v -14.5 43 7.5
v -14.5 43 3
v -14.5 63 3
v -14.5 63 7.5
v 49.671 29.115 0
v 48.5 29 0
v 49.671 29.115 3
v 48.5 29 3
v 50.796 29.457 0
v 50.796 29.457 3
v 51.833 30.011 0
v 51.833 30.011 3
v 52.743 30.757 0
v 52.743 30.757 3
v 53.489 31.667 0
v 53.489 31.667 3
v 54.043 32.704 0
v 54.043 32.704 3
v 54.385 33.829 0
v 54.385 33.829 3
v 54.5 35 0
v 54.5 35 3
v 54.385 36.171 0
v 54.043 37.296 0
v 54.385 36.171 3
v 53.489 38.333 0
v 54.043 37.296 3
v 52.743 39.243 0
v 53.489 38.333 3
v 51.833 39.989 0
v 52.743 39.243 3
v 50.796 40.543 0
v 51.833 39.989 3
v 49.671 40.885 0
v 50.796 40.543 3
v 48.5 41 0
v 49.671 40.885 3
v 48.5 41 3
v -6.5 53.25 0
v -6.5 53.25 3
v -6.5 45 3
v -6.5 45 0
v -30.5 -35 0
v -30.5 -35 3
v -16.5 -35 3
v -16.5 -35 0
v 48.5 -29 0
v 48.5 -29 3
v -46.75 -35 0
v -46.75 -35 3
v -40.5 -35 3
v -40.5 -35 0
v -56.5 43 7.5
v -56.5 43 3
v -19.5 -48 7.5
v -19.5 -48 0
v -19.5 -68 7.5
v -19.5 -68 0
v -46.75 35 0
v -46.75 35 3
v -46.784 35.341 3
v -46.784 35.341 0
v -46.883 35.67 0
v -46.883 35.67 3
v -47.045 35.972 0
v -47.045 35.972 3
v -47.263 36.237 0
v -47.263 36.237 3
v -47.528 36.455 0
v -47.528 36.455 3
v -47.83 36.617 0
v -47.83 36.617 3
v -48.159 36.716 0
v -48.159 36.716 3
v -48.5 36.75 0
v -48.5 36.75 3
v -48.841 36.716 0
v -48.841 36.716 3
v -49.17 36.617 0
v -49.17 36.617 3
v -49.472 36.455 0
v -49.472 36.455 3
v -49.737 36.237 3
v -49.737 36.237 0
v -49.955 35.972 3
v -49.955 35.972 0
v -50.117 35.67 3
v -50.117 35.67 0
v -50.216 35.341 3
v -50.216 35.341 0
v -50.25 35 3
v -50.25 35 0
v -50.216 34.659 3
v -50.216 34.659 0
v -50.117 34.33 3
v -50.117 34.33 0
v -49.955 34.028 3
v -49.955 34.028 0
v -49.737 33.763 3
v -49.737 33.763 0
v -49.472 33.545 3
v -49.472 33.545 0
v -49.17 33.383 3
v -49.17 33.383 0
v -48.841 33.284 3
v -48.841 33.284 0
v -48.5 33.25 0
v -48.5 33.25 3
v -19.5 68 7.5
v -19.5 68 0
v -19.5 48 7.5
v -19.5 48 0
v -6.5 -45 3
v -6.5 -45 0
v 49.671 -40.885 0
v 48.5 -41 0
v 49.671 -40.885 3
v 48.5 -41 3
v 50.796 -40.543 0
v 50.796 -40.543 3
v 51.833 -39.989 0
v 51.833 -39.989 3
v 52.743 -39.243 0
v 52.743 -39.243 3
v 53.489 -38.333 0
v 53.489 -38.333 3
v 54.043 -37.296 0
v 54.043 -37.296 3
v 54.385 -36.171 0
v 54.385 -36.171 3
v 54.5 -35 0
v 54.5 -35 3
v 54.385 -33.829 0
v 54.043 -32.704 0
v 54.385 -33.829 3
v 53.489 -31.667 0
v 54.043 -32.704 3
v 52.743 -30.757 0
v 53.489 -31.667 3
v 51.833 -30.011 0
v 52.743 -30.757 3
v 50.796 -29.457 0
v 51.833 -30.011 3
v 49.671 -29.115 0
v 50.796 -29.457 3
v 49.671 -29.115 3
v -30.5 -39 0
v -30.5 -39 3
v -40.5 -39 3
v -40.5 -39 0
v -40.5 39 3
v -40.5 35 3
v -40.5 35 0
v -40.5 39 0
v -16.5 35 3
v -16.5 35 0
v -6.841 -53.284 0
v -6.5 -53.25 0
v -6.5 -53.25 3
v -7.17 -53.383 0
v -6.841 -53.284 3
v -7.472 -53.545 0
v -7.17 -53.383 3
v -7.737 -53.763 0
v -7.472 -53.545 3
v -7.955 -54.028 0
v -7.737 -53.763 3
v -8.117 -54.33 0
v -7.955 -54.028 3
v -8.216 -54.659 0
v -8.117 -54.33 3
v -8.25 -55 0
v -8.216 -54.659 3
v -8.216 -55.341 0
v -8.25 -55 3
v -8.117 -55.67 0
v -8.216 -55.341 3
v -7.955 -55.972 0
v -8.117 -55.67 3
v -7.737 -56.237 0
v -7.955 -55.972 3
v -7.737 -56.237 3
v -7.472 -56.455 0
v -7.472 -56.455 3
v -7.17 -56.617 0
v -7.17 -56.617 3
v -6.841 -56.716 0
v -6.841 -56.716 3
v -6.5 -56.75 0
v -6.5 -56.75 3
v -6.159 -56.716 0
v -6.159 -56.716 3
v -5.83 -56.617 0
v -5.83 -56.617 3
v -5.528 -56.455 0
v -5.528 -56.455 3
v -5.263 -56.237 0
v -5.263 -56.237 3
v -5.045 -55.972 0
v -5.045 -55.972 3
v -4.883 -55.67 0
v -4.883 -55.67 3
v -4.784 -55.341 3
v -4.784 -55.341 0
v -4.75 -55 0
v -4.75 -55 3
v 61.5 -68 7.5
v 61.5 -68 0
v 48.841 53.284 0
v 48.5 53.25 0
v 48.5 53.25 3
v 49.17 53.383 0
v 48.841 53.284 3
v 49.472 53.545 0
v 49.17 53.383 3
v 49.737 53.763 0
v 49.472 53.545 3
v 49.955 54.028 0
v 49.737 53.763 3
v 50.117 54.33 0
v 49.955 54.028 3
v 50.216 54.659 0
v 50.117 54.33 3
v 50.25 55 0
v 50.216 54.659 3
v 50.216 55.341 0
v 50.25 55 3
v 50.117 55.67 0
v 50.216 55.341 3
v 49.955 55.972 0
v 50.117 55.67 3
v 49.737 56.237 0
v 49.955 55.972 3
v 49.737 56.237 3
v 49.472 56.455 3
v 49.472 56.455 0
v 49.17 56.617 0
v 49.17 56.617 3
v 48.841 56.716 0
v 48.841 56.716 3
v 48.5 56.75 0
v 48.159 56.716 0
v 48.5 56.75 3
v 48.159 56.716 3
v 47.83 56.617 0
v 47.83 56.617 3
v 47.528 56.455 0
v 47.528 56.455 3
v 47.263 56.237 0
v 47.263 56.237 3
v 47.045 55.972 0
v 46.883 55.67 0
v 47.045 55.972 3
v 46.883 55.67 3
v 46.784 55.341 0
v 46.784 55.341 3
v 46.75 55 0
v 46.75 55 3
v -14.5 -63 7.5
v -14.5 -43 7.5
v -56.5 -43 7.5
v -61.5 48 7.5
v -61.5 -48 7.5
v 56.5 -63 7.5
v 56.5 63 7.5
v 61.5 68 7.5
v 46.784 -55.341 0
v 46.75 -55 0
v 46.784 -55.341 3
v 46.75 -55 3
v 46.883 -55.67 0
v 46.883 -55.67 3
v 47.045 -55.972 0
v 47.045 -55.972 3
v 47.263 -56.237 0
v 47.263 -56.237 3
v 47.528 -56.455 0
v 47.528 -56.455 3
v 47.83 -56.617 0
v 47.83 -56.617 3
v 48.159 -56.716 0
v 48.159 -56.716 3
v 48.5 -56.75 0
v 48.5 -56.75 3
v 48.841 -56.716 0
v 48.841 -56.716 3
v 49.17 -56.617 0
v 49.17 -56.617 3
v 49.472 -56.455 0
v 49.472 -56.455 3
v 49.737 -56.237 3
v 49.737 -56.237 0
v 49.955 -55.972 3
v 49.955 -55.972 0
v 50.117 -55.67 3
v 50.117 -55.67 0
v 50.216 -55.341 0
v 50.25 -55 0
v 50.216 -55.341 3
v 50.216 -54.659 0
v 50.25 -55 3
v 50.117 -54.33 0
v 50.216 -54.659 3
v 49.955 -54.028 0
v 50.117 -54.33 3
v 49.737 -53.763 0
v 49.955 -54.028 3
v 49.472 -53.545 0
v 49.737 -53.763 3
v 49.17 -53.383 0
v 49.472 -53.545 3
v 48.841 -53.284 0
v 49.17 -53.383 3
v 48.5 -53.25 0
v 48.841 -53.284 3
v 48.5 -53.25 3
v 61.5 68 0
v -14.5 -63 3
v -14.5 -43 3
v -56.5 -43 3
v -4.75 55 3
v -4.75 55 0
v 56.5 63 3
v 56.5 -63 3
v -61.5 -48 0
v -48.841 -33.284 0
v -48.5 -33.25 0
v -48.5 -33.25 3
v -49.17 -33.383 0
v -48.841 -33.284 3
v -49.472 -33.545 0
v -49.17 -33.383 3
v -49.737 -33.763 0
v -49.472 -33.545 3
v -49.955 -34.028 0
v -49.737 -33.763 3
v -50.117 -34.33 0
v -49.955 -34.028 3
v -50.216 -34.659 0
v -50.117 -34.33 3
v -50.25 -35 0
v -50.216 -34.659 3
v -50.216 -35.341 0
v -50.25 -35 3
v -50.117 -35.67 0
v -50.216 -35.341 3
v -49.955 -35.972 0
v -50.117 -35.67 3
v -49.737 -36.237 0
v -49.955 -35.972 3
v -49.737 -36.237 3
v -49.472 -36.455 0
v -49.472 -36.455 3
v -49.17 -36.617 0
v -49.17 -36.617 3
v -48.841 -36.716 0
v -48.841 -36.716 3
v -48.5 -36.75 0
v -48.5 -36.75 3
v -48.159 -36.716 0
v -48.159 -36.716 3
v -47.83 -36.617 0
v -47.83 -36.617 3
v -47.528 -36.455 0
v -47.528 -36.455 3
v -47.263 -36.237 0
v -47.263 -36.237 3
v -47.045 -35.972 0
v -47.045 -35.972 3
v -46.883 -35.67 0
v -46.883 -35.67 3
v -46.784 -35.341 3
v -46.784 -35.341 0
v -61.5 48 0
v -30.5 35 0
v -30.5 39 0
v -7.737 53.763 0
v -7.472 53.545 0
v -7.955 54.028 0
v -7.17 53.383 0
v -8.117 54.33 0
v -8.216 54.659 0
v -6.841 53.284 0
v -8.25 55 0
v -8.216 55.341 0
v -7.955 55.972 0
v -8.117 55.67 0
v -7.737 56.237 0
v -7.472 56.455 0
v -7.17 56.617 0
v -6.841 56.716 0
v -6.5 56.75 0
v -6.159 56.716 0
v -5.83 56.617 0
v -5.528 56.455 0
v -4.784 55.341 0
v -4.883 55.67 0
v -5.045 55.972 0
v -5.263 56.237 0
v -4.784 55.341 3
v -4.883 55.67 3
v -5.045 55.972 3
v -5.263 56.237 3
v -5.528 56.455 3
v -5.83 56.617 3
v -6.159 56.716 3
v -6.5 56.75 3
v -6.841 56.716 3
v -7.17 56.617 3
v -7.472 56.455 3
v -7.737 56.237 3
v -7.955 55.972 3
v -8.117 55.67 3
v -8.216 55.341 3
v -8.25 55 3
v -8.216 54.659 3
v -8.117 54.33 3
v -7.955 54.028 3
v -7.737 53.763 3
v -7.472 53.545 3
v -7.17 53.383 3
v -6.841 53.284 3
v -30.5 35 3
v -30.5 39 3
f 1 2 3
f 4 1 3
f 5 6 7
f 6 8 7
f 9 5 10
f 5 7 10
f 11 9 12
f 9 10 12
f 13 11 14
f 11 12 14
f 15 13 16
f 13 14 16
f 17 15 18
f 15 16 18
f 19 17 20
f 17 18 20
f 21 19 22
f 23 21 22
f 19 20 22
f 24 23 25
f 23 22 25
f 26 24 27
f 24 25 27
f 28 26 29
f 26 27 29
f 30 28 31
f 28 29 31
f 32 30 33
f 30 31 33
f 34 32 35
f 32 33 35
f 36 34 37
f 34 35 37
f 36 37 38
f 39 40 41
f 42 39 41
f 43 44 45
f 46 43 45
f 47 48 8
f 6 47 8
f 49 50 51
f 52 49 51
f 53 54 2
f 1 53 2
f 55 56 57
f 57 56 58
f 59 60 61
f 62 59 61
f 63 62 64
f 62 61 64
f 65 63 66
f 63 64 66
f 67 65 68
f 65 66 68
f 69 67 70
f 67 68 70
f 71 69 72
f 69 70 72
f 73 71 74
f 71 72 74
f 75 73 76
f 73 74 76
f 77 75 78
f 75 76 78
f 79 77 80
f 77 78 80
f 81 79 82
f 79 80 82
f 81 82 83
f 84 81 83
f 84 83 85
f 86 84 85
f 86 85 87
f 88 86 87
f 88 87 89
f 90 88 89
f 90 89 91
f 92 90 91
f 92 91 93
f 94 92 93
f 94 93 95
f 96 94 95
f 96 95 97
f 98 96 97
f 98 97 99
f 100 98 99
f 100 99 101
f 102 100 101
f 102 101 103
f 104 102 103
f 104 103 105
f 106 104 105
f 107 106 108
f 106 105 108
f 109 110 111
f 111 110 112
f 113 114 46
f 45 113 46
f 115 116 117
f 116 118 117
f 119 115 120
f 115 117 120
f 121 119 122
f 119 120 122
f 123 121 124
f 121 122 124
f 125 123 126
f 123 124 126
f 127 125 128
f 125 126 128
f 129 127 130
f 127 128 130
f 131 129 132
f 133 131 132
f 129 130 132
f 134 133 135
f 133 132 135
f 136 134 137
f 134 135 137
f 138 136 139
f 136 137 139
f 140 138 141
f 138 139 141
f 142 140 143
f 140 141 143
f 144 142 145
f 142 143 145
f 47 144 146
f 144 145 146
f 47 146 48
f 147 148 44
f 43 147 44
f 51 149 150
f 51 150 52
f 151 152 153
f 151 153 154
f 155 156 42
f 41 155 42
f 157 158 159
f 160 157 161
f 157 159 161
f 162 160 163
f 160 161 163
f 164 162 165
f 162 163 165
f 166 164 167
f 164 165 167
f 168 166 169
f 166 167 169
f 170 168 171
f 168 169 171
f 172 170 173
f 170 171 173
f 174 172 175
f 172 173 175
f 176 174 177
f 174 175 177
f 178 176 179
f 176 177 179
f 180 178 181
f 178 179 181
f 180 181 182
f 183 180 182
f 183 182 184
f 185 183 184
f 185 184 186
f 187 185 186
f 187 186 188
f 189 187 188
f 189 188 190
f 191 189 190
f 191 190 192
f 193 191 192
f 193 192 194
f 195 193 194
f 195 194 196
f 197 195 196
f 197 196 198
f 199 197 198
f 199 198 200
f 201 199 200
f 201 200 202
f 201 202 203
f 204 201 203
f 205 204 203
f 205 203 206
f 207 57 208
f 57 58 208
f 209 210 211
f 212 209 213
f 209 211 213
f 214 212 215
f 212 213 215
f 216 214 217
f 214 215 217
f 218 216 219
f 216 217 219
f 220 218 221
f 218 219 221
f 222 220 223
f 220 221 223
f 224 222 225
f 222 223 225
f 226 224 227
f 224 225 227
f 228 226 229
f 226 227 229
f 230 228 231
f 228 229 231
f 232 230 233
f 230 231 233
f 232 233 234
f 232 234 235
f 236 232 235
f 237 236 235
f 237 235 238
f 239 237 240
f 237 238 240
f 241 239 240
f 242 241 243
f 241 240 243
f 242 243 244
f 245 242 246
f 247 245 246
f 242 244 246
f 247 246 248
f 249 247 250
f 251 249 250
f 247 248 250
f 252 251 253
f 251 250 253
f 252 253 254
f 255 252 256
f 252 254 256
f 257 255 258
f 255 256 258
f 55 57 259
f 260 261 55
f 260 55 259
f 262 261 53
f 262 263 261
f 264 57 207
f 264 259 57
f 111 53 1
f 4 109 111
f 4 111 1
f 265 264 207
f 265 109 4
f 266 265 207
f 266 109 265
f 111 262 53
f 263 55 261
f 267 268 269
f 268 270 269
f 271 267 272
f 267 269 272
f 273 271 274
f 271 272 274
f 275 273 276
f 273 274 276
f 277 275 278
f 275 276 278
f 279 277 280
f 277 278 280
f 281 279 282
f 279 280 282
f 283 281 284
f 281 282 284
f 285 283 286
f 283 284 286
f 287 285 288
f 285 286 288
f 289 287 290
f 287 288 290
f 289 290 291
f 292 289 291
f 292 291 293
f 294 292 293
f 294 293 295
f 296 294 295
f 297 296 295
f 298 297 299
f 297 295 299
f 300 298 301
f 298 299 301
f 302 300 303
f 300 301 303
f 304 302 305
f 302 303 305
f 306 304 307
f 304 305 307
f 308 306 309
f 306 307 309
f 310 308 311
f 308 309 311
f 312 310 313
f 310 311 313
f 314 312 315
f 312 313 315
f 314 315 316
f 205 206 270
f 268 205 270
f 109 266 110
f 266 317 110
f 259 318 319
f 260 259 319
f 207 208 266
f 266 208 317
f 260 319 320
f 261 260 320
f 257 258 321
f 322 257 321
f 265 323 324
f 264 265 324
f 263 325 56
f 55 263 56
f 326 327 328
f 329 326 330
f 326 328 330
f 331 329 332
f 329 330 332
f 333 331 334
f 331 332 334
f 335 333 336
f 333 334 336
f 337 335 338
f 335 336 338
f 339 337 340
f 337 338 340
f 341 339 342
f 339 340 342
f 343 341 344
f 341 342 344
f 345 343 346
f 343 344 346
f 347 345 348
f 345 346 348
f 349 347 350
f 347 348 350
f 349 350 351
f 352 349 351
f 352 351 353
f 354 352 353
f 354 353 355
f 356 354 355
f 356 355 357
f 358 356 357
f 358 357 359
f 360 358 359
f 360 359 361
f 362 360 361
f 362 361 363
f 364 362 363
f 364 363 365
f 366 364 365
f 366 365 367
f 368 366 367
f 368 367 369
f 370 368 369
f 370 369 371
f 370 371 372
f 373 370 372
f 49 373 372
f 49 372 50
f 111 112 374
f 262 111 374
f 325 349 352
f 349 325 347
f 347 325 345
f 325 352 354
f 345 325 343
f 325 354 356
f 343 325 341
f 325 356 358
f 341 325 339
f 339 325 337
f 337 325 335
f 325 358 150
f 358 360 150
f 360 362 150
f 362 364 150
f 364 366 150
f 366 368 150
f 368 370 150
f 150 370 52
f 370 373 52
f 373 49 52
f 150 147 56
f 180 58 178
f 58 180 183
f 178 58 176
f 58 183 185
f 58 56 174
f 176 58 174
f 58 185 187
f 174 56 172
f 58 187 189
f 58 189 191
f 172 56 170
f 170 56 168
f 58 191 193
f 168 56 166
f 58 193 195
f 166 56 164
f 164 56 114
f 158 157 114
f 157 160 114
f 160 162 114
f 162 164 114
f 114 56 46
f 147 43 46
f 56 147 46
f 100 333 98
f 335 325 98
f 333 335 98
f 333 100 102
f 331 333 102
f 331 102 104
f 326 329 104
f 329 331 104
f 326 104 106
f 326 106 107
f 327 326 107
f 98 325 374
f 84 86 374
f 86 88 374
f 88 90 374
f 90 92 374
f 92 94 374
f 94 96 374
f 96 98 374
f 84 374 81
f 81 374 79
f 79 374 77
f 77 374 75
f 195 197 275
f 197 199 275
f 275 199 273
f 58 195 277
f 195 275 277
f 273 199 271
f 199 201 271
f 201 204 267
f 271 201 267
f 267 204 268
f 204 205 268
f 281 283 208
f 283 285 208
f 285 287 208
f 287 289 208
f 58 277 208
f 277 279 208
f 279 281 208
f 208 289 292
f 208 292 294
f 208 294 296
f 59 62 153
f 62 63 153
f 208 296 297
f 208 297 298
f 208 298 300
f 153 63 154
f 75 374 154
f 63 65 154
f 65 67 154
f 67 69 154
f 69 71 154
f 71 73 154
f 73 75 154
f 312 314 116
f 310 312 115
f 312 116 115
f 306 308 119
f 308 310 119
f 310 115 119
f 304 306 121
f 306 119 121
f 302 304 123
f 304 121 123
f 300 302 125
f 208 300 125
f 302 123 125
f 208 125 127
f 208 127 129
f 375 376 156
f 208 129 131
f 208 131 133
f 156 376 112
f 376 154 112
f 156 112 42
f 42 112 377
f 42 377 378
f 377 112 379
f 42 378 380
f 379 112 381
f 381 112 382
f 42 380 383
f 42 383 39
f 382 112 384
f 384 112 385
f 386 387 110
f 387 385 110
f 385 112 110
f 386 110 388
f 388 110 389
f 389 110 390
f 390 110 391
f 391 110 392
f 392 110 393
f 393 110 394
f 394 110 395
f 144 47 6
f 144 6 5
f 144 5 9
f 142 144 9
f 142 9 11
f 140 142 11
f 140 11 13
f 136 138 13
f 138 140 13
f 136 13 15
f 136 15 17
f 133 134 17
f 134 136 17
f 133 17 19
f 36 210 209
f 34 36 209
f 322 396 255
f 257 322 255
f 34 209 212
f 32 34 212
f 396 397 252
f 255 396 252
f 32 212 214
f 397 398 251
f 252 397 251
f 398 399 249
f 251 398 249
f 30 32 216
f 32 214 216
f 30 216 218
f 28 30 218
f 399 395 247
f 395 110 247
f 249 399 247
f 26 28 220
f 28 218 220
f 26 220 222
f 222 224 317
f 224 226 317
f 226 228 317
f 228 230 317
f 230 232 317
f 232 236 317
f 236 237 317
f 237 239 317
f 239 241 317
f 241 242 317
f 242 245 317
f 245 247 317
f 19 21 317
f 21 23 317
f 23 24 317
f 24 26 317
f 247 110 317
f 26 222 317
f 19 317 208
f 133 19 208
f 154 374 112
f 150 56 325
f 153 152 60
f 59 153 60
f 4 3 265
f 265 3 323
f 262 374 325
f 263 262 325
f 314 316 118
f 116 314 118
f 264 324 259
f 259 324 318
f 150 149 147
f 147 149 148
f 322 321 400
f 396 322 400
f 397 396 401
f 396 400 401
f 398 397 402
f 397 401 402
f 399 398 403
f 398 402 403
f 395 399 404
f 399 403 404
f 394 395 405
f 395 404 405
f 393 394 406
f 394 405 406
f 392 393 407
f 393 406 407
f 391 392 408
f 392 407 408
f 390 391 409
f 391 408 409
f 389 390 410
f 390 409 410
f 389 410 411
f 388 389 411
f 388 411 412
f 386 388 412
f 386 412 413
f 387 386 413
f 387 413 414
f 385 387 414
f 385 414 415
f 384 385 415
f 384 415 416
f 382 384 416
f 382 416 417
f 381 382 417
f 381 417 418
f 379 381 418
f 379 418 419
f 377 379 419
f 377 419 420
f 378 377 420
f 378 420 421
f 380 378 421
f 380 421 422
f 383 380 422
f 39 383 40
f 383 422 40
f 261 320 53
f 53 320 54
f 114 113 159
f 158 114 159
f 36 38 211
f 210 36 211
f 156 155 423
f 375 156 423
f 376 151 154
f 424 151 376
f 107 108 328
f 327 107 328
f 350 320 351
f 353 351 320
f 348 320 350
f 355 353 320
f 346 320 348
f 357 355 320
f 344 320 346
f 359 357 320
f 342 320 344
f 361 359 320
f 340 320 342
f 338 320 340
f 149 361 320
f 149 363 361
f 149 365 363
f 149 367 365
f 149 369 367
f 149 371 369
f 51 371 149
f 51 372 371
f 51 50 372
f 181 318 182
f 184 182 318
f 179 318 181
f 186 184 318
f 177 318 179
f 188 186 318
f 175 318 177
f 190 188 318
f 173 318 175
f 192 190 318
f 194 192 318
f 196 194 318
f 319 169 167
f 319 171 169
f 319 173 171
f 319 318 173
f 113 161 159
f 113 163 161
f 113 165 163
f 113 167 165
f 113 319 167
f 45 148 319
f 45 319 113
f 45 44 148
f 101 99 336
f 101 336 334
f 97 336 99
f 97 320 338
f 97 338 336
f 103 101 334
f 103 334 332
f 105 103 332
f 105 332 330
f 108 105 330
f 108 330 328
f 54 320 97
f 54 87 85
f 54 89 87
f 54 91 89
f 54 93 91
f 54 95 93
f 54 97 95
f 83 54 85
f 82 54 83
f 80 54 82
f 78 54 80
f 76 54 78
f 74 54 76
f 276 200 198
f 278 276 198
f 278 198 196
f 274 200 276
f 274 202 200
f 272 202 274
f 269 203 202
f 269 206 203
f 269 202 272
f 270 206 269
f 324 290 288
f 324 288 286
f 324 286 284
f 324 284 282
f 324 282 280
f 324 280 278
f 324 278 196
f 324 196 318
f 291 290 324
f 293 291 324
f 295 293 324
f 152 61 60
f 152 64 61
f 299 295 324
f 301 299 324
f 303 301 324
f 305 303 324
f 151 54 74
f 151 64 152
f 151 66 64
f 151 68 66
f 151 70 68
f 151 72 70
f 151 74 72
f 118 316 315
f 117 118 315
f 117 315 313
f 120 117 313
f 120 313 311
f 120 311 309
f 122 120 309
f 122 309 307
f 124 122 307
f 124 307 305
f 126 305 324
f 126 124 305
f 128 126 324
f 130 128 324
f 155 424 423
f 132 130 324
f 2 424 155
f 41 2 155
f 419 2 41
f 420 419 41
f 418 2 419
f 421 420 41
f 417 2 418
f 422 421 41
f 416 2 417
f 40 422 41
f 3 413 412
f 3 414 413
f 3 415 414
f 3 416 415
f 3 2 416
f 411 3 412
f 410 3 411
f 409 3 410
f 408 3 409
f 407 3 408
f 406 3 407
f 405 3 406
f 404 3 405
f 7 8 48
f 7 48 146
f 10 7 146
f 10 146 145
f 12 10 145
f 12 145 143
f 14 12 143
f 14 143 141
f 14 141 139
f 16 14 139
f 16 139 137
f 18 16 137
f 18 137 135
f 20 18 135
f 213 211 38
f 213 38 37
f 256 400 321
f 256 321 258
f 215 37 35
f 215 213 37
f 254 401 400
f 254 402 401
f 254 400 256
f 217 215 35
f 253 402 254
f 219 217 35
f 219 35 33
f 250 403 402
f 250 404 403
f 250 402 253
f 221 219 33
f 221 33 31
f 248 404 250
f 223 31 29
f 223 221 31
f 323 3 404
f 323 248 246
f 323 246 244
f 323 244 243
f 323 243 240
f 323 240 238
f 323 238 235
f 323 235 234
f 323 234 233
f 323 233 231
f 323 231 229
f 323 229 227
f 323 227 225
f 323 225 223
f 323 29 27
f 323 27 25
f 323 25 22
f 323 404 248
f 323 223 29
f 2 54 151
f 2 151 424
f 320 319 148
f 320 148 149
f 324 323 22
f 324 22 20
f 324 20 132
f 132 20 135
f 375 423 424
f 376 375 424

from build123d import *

# Parameters (mm, degrees)
F1_DEPTH  = 3
F3_DEPTH  = 3
F5_DEPTH  = 3.001
F6_R      = 1.75
F6_R_2    = 6
F6_W      = 10
F6_H      = 4
F7_DEPTH  = 25
F9_DEPTH  = 4.5
F11_DEPTH = 7.501


with BuildPart() as f1:
    # F0 (on Top) → F1 (new body)
    with BuildSketch(Plane.XY):
        Polygon((56.5, 63), (-14.5, 63), (-14.5, 43), (-56.5, 43), (-56.5, -43), (-14.5, -43), (-14.5, -63), (56.5, -63), align=None)
    extrude(amount=F1_DEPTH)

    # F2 (on face) → F3 (join, through all)
    with BuildSketch(Plane.XY.offset(3)):
        Polygon((-19.5, -68), (61.5, -68), (61.5, 68), (-19.5, 68), (-19.5, 48), (-61.5, 48), (-61.5, -48), (-19.5, -48), align=None)
        Polygon((-14.5, 63), (56.5, 63), (56.5, -63), (-14.5, -63), (-14.5, -43), (-56.5, -43), (-56.5, 43), (-14.5, 43), align=None, mode=Mode.SUBTRACT)
    extrude(amount=-F3_DEPTH)

    # F4 (on face) → F5 (cut, through all)
    with BuildSketch(Plane.XY.offset(3)):
        Polygon((-6.5, 55), (-6.5, 35), (-48.5, 35), (-48.5, -35), (-6.5, -35), (-6.5, -55), (48.5, -55), (48.5, 55), align=None)
    extrude(amount=-F5_DEPTH, mode=Mode.SUBTRACT)

    # F6 (on face) → F7 (cut)
    with BuildSketch(Plane.XY.offset(3)):
        with Locations((-48.5, 35)):
            Circle(F6_R)
        with Locations((-6.5, 55)):
            Circle(F6_R)
        with Locations((48.5, 55)):
            Circle(F6_R)
        with Locations((48.5, -55)):
            Circle(F6_R)
        with Locations((-6.5, -55)):
            Circle(F6_R)
        with Locations((-48.5, -35)):
            Circle(F6_R)
        with Locations((48.5, 35)):
            Circle(F6_R_2)
        with Locations((48.5, -35)):
            Circle(F6_R_2)
        with Locations((-35.5, 37)):
            Rectangle(F6_W, F6_H)
        with Locations((-35.5, -37)):
            Rectangle(F6_W, F6_H)
    extrude(amount=-F7_DEPTH, mode=Mode.SUBTRACT)

    # F8 (on face) → F9 (join)
    with BuildSketch(Plane.XY.offset(3)):
        Polygon((-19.5, -48), (-19.5, -68), (61.5, -68), (61.5, 68), (-19.5, 68), (-19.5, 48), (-61.5, 48), (-61.5, -48), align=None)
        Polygon((-14.5, 43), (-14.5, 63), (56.5, 63), (56.5, -63), (-14.5, -63), (-14.5, -43), (-56.5, -43), (-56.5, 43), align=None, mode=Mode.SUBTRACT)
    extrude(amount=F9_DEPTH)

    # F10 (on face) → F11 (cut, through all)
    with BuildSketch(Plane(origin=(0, 0, 0), x_dir=(1, 0, 0), z_dir=(0, 0, -1))):
        Polygon((-6.5, 35), (-6.5, 45), (-16.5, 35), align=None)
        Polygon((-16.5, -35), (-6.5, -45), (-6.5, -35), align=None)
    extrude(amount=-F11_DEPTH, mode=Mode.SUBTRACT)


solid = f1.part
